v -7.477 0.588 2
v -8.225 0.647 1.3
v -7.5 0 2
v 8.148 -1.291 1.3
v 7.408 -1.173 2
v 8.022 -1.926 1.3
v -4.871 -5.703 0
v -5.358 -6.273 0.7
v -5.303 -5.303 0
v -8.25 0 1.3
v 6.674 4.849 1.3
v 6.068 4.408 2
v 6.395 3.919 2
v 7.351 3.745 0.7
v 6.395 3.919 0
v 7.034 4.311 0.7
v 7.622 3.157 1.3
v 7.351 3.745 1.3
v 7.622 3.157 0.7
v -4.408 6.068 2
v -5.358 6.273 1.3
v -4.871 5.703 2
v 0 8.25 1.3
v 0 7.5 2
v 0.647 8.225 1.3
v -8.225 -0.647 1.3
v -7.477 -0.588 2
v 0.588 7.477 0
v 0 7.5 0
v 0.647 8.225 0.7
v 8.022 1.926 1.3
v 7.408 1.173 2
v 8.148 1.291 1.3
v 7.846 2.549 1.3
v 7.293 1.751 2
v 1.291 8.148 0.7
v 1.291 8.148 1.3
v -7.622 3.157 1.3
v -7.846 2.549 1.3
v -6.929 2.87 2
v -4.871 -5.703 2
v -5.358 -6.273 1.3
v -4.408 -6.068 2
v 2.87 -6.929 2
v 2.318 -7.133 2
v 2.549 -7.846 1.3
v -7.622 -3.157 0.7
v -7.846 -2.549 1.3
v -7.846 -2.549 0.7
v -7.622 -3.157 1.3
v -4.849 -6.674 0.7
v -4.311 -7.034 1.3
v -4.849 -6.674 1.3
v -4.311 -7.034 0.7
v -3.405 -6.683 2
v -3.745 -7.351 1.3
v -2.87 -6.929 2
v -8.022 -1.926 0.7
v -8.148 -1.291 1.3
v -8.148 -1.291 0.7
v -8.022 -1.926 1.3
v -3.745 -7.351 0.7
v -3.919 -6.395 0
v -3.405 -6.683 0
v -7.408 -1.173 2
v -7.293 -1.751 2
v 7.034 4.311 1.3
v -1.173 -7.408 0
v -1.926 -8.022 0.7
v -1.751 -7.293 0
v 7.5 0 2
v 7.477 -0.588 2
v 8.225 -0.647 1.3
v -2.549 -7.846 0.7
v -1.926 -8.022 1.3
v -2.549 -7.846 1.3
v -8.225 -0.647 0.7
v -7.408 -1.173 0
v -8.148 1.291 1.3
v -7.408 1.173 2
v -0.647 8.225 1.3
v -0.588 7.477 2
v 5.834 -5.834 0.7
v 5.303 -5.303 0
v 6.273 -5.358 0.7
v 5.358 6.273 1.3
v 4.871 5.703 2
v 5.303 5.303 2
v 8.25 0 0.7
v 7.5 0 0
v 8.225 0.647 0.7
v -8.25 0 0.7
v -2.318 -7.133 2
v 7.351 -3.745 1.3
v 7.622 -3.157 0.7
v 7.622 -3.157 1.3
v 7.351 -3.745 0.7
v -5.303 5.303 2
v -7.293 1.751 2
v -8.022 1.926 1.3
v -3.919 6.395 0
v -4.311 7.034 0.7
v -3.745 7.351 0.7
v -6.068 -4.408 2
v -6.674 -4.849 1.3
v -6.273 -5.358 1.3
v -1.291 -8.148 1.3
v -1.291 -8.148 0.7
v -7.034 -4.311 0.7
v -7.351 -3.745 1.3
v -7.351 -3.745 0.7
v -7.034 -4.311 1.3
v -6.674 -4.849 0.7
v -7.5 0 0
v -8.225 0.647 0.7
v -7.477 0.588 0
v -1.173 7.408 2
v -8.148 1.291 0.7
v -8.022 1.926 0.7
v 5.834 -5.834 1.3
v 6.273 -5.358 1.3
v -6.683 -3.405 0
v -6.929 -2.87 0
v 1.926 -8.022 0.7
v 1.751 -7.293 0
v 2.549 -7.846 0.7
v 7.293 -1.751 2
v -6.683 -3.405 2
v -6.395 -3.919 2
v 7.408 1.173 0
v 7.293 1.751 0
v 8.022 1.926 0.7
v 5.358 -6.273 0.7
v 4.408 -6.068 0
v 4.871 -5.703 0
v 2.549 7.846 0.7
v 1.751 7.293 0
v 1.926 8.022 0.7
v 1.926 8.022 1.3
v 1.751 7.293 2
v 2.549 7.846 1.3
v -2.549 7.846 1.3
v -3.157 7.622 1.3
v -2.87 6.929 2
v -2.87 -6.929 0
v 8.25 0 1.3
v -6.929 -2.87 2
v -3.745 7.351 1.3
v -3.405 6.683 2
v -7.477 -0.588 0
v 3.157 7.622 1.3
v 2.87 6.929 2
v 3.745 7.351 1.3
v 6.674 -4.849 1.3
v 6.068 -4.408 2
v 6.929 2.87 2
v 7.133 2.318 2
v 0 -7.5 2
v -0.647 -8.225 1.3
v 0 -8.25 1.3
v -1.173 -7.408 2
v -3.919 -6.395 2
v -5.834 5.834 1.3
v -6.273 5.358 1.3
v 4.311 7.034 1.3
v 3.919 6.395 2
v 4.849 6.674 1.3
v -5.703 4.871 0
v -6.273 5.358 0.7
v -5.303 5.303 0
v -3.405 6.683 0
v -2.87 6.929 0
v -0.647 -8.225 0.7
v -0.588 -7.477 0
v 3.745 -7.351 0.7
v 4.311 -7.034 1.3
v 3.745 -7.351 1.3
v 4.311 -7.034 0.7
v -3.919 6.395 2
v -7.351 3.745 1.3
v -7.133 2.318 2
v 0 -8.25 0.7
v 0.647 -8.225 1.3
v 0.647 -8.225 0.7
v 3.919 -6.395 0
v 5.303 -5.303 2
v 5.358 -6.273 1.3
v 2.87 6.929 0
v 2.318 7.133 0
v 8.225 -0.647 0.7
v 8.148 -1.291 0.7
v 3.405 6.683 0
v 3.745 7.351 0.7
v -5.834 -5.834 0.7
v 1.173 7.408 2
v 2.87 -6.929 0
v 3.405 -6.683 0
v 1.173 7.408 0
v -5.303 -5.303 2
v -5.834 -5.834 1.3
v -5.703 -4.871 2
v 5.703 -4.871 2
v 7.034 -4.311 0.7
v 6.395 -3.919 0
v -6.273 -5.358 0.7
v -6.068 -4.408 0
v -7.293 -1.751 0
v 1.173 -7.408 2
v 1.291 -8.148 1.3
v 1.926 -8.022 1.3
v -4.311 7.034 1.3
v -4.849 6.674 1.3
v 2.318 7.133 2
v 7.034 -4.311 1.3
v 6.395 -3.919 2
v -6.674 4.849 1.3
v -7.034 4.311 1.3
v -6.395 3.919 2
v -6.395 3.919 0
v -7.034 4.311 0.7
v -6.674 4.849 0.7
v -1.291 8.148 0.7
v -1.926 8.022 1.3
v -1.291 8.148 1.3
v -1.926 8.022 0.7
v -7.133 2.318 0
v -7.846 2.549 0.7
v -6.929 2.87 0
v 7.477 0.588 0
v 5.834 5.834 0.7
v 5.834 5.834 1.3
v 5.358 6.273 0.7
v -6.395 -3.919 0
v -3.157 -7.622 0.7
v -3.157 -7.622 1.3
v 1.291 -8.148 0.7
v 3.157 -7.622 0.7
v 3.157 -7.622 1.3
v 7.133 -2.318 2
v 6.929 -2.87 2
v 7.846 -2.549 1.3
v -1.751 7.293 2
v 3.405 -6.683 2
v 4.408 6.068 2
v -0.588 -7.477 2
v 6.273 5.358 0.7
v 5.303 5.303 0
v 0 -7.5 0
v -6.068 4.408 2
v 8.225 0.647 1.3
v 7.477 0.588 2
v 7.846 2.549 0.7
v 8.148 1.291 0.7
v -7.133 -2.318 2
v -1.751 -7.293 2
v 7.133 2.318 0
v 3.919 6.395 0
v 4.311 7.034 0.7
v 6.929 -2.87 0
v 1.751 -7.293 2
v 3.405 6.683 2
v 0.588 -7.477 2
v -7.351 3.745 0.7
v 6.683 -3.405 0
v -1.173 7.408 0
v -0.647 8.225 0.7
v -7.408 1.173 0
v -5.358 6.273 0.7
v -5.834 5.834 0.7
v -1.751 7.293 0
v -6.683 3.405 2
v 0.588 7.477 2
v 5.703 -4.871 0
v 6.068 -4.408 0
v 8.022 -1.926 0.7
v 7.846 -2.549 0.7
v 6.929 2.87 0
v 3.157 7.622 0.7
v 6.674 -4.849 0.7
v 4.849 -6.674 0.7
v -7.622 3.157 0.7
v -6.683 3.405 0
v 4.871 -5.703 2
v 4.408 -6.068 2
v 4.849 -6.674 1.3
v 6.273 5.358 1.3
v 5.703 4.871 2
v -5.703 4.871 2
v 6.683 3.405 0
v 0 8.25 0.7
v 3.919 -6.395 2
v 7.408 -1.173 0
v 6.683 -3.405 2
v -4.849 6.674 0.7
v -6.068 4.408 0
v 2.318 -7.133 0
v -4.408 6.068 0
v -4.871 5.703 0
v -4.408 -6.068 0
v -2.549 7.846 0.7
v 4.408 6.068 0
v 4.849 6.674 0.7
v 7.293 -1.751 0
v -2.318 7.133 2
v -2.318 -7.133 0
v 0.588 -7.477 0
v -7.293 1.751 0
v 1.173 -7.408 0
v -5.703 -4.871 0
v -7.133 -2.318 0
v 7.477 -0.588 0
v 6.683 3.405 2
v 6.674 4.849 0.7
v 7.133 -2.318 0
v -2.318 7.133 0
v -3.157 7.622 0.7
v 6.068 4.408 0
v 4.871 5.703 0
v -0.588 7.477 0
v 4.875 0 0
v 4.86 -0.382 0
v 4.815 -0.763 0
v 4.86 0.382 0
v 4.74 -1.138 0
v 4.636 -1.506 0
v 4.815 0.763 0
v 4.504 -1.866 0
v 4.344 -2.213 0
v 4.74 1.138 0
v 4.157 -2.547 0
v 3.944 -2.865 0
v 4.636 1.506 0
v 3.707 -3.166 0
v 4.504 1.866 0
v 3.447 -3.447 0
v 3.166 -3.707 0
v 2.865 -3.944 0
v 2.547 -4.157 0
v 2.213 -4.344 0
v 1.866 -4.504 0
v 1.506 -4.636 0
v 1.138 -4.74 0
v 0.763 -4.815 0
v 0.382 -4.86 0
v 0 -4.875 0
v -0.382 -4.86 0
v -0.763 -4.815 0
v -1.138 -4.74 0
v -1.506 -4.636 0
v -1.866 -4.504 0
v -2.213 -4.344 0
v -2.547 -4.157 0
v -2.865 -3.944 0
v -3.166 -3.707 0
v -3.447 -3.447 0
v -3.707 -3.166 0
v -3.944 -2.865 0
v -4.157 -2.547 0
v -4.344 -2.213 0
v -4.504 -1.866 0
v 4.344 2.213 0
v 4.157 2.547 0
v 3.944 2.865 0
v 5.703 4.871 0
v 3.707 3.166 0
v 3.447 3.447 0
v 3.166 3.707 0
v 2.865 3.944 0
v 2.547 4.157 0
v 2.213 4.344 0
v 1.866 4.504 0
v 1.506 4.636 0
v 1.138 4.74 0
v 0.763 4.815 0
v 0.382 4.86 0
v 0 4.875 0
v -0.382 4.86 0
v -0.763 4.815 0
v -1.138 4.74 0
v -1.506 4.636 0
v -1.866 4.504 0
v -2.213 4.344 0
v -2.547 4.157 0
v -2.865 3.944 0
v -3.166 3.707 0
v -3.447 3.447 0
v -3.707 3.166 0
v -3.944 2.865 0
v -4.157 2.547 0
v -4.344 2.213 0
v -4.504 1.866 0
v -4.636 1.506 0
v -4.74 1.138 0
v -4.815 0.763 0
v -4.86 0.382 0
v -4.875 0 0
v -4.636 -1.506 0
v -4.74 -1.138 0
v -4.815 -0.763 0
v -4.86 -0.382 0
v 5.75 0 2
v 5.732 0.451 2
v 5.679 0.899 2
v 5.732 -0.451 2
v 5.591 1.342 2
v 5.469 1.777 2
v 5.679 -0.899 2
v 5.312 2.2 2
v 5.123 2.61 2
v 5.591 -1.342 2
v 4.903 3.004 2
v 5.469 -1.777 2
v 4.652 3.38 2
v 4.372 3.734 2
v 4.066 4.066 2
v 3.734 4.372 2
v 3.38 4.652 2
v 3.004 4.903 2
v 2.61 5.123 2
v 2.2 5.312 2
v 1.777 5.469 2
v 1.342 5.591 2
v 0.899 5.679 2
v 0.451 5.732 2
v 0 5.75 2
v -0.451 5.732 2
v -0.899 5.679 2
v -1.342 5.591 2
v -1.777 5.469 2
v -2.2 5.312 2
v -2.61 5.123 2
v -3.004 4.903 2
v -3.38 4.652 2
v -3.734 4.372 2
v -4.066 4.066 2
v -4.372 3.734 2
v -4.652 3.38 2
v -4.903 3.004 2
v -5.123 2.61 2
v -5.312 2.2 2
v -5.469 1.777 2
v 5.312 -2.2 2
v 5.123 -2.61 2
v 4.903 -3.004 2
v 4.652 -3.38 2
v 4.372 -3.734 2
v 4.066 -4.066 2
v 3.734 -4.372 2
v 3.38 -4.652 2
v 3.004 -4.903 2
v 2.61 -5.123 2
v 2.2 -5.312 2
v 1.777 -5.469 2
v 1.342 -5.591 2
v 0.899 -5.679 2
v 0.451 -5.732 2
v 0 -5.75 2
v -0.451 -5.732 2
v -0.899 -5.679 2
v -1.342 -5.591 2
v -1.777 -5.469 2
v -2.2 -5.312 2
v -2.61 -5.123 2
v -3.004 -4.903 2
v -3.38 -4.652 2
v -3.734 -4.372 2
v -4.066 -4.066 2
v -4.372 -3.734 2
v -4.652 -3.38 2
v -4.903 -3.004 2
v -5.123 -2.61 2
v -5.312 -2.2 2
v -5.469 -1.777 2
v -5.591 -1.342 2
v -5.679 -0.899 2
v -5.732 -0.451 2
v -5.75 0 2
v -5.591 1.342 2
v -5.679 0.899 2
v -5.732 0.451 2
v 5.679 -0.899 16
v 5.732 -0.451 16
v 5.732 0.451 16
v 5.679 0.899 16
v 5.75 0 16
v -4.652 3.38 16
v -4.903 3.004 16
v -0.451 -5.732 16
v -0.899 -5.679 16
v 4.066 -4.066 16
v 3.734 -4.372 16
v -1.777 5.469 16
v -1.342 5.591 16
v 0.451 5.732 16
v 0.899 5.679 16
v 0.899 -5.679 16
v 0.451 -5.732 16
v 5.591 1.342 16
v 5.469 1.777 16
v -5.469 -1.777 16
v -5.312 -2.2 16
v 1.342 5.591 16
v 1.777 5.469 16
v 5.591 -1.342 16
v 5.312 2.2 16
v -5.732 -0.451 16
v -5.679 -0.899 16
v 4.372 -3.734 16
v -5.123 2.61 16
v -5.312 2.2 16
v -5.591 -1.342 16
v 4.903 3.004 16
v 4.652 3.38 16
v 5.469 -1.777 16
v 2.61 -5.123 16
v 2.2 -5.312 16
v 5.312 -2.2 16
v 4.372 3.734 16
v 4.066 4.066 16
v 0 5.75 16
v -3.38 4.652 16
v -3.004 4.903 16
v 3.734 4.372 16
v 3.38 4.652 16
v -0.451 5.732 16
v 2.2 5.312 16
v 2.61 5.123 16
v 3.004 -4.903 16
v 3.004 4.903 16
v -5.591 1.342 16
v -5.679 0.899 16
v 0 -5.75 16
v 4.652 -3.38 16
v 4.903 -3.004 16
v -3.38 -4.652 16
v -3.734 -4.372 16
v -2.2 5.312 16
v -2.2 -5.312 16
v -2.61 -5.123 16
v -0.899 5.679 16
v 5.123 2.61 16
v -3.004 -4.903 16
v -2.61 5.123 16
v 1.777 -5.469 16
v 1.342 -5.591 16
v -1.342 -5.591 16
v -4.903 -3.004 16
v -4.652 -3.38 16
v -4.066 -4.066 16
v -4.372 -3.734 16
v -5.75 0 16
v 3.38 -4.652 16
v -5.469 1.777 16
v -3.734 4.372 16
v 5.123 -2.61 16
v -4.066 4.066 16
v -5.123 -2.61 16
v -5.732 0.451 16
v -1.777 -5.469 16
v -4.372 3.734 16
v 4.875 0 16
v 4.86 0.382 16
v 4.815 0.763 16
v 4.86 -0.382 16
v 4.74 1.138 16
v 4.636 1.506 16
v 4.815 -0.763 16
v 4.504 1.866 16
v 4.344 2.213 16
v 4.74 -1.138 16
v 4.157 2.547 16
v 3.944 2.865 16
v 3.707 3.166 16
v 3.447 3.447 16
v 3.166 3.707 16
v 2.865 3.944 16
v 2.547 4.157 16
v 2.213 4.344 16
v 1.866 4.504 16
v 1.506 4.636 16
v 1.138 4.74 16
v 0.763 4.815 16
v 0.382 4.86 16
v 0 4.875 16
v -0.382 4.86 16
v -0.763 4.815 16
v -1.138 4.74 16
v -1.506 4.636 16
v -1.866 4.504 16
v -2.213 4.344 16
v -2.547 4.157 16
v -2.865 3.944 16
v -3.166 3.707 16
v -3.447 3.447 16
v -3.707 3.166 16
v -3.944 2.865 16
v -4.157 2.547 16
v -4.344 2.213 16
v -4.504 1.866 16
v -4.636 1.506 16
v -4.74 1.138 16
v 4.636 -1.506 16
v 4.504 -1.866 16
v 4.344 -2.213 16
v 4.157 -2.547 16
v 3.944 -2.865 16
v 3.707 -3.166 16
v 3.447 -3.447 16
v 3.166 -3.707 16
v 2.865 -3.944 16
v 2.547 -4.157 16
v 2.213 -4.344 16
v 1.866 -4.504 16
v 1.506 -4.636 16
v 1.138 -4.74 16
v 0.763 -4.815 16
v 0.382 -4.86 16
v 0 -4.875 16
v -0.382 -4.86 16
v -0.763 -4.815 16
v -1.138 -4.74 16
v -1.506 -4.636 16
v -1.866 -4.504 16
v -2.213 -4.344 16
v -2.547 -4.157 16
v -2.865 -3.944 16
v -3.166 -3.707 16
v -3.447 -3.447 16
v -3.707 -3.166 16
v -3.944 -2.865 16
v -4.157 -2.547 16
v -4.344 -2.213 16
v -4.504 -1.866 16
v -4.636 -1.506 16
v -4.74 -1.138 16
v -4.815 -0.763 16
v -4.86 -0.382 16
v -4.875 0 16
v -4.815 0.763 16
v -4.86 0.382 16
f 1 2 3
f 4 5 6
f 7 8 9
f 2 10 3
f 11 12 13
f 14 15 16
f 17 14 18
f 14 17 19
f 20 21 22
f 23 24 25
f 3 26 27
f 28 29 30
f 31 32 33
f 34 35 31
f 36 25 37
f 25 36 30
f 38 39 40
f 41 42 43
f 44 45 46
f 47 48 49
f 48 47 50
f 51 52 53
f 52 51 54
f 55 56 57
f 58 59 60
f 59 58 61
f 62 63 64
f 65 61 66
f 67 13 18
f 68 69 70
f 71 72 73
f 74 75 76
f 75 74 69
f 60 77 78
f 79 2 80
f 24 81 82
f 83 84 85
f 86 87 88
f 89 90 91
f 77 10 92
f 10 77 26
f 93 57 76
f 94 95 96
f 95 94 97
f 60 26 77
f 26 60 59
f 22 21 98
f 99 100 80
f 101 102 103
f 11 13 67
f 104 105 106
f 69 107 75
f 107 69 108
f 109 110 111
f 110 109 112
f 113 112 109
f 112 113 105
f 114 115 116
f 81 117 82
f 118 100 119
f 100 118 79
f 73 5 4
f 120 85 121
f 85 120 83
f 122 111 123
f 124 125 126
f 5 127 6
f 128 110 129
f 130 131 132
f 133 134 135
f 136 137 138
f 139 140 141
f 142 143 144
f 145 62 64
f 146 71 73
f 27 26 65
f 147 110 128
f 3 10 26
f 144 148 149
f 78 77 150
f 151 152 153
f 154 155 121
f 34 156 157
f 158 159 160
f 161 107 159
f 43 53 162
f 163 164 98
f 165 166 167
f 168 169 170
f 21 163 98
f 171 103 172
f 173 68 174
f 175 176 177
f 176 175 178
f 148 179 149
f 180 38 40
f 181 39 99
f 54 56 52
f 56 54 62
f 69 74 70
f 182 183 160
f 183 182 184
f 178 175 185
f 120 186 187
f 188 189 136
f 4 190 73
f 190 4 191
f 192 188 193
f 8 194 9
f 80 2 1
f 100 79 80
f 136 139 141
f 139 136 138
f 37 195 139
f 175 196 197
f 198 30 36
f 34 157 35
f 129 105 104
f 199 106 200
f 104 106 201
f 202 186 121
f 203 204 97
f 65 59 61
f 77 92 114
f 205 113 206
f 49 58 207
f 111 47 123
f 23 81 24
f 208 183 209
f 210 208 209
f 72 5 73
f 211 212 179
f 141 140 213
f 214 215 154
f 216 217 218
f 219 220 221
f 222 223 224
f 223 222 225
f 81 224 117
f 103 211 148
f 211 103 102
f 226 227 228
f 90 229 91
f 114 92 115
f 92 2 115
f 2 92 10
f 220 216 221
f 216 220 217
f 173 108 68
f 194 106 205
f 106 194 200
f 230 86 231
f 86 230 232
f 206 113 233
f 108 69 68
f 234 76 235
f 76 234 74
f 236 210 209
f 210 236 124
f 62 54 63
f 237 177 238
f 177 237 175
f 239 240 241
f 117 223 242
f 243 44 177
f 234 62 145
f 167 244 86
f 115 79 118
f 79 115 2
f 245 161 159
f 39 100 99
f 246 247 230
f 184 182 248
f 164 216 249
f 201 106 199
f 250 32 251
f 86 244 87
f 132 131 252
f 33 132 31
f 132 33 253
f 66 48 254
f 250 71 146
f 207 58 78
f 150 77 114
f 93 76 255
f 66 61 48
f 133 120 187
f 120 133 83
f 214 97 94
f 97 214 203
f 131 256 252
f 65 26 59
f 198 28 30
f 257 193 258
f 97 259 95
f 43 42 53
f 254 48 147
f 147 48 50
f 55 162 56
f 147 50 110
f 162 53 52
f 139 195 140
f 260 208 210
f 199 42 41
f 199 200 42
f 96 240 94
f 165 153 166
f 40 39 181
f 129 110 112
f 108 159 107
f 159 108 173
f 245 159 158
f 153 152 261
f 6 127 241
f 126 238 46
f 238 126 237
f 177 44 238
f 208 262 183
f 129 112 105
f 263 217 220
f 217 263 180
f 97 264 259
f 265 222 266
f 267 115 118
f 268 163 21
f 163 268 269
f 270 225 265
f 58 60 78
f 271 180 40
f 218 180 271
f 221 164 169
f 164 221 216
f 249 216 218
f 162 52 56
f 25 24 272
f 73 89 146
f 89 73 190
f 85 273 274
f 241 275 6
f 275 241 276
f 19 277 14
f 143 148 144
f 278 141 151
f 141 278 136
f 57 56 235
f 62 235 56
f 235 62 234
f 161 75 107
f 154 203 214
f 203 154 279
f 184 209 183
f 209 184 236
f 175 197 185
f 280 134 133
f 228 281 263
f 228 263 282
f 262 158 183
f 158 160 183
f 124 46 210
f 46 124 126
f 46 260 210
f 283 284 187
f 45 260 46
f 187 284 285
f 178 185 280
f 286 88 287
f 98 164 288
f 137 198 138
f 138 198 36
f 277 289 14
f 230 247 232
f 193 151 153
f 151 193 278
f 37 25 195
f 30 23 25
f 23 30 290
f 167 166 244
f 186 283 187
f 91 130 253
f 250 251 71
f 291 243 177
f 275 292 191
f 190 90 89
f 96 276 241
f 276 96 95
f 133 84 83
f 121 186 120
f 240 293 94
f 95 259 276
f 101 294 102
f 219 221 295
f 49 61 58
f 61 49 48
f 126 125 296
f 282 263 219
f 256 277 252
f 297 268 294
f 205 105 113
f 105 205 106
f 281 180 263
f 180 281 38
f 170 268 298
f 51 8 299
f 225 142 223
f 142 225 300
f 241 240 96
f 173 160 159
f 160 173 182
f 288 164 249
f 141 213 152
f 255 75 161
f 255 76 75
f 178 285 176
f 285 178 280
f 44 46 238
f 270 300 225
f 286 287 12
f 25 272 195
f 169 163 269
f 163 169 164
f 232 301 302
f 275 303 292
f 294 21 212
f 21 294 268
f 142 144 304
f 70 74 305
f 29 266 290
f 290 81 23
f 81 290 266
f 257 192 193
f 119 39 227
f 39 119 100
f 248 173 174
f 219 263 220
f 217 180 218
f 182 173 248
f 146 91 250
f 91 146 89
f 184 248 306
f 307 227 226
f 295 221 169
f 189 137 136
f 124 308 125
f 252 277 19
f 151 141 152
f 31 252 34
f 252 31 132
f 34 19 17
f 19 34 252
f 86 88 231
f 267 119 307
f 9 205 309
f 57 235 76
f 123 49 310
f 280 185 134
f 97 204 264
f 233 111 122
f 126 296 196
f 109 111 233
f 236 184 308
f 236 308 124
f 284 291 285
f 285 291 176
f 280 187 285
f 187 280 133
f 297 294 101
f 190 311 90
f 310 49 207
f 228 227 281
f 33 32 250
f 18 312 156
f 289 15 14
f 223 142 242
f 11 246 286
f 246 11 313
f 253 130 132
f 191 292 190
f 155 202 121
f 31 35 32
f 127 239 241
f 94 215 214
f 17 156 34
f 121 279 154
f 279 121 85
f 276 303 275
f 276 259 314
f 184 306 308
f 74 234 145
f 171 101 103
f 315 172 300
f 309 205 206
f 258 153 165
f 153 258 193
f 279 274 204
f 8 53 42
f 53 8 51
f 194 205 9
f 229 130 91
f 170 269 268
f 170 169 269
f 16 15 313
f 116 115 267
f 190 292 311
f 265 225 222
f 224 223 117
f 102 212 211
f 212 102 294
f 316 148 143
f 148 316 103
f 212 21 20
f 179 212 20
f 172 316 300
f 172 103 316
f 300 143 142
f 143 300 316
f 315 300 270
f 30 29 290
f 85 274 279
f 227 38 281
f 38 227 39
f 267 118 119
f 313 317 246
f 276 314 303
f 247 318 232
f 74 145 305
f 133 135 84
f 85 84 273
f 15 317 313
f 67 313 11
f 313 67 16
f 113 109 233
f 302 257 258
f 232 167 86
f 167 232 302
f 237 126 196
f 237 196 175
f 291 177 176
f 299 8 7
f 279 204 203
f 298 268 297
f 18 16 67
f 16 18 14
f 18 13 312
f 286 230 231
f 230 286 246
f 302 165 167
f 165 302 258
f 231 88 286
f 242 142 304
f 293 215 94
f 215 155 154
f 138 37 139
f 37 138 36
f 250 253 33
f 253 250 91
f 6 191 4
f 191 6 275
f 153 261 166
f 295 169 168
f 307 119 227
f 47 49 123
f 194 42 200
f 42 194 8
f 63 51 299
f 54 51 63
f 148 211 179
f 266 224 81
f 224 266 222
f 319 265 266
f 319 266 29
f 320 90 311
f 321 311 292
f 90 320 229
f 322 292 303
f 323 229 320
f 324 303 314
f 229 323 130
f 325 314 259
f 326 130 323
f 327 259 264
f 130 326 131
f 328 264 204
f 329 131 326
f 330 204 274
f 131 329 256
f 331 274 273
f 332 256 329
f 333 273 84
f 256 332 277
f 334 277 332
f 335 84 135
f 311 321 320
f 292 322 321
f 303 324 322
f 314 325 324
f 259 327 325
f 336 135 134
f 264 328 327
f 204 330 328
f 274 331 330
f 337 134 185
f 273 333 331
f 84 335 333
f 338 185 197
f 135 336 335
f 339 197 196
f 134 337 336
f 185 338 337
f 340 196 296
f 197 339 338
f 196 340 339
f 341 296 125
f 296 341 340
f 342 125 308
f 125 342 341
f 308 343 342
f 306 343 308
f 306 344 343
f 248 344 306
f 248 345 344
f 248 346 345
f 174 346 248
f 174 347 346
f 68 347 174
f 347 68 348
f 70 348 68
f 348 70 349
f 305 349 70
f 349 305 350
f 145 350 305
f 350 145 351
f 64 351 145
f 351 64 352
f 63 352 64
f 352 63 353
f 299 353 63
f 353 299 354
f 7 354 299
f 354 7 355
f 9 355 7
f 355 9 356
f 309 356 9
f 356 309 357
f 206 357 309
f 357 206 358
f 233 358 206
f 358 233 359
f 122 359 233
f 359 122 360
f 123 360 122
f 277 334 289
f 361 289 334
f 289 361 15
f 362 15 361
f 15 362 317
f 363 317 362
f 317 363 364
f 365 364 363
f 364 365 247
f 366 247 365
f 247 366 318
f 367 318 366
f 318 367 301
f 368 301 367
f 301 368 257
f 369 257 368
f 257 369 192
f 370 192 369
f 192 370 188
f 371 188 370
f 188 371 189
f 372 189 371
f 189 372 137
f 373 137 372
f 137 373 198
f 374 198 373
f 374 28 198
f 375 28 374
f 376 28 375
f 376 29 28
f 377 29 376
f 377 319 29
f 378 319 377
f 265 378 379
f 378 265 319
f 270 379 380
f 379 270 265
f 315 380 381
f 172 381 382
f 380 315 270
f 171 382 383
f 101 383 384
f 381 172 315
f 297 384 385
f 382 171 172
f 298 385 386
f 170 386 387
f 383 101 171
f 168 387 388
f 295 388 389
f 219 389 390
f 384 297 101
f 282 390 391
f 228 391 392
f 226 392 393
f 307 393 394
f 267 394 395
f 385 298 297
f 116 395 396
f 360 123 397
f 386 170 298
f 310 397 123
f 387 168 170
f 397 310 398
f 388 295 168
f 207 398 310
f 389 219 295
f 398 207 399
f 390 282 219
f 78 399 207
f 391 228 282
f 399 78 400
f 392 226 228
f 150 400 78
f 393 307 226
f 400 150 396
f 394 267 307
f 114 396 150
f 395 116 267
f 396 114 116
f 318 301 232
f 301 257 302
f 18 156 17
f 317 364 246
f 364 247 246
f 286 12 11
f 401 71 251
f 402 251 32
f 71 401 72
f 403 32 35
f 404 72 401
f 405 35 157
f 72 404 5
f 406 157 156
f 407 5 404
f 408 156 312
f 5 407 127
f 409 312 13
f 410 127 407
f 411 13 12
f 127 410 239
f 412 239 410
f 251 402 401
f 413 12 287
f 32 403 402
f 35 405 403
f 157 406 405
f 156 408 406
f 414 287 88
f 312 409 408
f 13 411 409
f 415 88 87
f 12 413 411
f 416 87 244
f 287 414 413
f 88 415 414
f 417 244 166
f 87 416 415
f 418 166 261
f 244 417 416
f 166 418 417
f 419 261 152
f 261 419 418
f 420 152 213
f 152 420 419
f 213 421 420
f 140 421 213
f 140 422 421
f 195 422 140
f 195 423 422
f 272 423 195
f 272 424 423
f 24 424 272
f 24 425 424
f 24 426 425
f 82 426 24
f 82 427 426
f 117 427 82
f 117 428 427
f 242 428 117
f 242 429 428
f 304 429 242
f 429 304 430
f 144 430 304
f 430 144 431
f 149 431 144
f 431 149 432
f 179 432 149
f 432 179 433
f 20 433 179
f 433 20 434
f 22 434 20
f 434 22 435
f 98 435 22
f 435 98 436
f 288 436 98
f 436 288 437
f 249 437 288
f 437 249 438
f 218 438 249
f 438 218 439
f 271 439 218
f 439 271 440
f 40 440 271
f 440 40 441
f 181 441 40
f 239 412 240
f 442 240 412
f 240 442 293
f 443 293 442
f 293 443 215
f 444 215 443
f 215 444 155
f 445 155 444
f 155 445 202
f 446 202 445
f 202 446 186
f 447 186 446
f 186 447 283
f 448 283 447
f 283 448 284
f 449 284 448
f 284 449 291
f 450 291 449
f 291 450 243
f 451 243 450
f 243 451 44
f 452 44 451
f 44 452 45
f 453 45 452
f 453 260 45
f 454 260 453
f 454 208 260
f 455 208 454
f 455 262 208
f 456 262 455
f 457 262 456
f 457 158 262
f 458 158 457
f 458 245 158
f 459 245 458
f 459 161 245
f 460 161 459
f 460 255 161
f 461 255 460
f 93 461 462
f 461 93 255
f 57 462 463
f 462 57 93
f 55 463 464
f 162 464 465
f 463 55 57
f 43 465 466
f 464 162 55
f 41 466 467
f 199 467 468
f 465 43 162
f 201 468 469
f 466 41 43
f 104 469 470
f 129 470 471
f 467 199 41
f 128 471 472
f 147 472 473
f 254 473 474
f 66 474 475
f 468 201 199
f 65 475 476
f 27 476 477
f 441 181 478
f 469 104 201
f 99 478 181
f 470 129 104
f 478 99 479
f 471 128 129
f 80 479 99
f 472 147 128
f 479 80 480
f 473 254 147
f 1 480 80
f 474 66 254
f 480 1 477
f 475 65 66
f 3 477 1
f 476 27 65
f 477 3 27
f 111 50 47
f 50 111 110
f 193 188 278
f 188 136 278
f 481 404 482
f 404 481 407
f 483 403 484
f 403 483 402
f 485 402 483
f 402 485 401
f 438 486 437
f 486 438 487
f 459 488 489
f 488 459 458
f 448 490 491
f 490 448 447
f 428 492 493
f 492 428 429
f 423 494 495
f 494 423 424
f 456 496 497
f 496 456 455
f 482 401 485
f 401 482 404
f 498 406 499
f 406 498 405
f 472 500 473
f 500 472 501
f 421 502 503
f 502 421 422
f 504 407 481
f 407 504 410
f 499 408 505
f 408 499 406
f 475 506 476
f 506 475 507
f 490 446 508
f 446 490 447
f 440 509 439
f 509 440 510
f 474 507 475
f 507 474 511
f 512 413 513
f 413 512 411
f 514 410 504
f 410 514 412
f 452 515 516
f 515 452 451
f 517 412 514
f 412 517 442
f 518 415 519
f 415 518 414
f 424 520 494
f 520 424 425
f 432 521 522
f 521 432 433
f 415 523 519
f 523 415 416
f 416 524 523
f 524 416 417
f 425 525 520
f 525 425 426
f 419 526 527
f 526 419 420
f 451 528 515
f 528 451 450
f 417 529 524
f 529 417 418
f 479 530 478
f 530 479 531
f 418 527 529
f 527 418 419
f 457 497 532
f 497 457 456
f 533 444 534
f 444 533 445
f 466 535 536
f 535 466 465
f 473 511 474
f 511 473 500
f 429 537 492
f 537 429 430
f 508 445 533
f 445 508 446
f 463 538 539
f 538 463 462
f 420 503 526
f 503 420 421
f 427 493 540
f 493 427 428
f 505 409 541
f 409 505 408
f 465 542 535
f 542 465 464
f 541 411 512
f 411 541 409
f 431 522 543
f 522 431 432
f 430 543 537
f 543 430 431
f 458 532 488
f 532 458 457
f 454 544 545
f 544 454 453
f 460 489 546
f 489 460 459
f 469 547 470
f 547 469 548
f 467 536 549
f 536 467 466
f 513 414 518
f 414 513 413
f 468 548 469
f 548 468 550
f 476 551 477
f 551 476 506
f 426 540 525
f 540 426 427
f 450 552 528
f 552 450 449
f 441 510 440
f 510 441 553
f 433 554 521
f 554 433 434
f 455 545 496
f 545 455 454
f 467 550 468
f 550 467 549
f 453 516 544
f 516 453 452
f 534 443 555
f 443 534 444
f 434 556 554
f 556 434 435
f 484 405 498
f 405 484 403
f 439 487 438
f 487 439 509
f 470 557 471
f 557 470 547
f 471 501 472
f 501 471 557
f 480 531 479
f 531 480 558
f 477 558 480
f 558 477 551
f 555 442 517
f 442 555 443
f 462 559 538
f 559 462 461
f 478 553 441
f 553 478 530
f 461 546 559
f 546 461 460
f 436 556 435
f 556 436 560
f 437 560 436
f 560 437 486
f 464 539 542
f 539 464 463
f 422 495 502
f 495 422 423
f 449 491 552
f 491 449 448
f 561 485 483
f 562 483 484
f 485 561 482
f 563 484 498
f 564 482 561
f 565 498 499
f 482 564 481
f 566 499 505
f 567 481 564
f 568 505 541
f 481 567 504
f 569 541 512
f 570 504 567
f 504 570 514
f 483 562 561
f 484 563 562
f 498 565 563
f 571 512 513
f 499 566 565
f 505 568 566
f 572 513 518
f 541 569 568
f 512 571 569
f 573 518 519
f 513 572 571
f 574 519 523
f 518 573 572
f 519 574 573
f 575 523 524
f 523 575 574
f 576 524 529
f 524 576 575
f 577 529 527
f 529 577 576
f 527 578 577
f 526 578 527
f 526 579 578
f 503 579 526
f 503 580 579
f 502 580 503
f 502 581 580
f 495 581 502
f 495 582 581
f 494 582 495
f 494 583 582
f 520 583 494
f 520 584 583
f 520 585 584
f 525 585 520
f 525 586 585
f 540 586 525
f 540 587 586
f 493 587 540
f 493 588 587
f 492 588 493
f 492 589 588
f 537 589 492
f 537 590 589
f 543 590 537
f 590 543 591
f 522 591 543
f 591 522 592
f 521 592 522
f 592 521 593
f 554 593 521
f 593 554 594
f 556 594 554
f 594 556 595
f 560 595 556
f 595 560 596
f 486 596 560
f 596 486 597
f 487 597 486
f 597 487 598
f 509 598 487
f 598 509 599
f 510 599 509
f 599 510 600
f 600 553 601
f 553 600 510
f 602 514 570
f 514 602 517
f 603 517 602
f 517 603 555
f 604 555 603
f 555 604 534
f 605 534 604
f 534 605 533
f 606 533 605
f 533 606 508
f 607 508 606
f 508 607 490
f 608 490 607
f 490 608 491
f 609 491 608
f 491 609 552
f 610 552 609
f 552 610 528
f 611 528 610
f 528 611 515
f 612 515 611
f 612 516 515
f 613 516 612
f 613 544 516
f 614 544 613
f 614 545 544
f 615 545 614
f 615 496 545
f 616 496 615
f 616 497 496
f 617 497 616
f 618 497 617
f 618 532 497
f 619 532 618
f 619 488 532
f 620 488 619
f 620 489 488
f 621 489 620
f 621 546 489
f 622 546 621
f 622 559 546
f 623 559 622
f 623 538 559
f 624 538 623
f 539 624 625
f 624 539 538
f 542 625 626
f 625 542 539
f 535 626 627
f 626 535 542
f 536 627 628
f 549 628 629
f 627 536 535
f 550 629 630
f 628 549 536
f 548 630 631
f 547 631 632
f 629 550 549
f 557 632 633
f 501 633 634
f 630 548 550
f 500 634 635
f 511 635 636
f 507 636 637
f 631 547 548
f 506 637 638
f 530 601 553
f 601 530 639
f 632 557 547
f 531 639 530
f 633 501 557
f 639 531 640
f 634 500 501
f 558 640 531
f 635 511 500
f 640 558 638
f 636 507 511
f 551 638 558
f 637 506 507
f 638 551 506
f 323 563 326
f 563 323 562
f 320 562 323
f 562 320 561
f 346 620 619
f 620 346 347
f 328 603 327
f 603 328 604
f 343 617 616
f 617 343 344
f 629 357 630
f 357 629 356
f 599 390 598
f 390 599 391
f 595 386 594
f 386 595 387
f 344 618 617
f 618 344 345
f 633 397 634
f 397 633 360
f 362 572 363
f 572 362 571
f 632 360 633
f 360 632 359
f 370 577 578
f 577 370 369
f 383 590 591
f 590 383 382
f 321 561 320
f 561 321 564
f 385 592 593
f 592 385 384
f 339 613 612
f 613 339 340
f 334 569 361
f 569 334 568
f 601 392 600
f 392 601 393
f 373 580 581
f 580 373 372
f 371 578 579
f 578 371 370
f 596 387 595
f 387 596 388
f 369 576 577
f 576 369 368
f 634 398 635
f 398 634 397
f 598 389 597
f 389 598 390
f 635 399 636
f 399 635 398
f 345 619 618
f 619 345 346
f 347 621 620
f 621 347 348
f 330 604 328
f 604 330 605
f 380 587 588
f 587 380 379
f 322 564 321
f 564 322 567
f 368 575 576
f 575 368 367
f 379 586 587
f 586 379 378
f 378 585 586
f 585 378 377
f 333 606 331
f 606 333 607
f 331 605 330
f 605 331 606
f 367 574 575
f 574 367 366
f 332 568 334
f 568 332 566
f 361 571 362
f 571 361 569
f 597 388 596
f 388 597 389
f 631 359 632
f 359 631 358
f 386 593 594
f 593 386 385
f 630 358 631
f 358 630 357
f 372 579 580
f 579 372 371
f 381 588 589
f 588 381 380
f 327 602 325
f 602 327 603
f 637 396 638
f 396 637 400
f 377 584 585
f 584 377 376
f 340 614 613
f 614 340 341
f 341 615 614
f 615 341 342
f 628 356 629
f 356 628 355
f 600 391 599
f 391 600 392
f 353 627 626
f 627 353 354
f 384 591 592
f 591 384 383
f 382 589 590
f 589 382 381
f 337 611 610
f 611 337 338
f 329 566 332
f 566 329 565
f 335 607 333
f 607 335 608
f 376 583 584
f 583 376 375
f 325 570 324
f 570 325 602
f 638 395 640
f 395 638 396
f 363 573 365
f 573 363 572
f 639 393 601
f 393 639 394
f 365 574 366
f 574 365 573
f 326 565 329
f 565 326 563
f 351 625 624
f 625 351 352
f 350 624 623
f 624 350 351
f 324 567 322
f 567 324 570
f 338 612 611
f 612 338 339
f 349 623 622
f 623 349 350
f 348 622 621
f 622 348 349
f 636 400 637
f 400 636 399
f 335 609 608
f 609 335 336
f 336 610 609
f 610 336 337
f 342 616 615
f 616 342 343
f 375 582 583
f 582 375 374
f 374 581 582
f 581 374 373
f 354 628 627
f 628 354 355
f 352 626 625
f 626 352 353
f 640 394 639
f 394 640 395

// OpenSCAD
// plotter pen adapter for Sharpie Fine Point markers
// created January, 2014 by Brian Boucheron <brian@boucheron.org>

band_full_thickness = 2;    // thickest point of the band
band_edge_thickness = 0.6;  // thinnest point of the band
band_full_diameter = 16.5;  // diameter at widest point of band
band_edge_diameter = 15;    // diameter where band starts to angle in


// sharpie outer diameter measured at 10.64mm
// plotter outer diameter measured at 11.50mm
body_outer_diameter = 11.5; // outer diameter of the main body
body_inner_diameter = 9.75; // inner diameter of the main body

profile = [
    [0,0],
    [band_edge_diameter / 2, 0],
    [band_full_diameter / 2, (band_full_thickness - band_edge_thickness) / 2],
    [band_full_diameter / 2, band_full_thickness - ((band_full_thickness - band_edge_thickness) / 2)],
    [band_edge_diameter / 2, band_full_thickness],
    [0,band_full_thickness],
    // end body
];

difference() {
	union() {
		rotate_extrude($fn=80) polygon(points=profile);
		cylinder(r=body_outer_diameter/2, h=16, $fn=80);
	}

	#translate([0,0,-25]) cylinder(r=body_inner_diameter/2, h=50, $fn=80);
}
